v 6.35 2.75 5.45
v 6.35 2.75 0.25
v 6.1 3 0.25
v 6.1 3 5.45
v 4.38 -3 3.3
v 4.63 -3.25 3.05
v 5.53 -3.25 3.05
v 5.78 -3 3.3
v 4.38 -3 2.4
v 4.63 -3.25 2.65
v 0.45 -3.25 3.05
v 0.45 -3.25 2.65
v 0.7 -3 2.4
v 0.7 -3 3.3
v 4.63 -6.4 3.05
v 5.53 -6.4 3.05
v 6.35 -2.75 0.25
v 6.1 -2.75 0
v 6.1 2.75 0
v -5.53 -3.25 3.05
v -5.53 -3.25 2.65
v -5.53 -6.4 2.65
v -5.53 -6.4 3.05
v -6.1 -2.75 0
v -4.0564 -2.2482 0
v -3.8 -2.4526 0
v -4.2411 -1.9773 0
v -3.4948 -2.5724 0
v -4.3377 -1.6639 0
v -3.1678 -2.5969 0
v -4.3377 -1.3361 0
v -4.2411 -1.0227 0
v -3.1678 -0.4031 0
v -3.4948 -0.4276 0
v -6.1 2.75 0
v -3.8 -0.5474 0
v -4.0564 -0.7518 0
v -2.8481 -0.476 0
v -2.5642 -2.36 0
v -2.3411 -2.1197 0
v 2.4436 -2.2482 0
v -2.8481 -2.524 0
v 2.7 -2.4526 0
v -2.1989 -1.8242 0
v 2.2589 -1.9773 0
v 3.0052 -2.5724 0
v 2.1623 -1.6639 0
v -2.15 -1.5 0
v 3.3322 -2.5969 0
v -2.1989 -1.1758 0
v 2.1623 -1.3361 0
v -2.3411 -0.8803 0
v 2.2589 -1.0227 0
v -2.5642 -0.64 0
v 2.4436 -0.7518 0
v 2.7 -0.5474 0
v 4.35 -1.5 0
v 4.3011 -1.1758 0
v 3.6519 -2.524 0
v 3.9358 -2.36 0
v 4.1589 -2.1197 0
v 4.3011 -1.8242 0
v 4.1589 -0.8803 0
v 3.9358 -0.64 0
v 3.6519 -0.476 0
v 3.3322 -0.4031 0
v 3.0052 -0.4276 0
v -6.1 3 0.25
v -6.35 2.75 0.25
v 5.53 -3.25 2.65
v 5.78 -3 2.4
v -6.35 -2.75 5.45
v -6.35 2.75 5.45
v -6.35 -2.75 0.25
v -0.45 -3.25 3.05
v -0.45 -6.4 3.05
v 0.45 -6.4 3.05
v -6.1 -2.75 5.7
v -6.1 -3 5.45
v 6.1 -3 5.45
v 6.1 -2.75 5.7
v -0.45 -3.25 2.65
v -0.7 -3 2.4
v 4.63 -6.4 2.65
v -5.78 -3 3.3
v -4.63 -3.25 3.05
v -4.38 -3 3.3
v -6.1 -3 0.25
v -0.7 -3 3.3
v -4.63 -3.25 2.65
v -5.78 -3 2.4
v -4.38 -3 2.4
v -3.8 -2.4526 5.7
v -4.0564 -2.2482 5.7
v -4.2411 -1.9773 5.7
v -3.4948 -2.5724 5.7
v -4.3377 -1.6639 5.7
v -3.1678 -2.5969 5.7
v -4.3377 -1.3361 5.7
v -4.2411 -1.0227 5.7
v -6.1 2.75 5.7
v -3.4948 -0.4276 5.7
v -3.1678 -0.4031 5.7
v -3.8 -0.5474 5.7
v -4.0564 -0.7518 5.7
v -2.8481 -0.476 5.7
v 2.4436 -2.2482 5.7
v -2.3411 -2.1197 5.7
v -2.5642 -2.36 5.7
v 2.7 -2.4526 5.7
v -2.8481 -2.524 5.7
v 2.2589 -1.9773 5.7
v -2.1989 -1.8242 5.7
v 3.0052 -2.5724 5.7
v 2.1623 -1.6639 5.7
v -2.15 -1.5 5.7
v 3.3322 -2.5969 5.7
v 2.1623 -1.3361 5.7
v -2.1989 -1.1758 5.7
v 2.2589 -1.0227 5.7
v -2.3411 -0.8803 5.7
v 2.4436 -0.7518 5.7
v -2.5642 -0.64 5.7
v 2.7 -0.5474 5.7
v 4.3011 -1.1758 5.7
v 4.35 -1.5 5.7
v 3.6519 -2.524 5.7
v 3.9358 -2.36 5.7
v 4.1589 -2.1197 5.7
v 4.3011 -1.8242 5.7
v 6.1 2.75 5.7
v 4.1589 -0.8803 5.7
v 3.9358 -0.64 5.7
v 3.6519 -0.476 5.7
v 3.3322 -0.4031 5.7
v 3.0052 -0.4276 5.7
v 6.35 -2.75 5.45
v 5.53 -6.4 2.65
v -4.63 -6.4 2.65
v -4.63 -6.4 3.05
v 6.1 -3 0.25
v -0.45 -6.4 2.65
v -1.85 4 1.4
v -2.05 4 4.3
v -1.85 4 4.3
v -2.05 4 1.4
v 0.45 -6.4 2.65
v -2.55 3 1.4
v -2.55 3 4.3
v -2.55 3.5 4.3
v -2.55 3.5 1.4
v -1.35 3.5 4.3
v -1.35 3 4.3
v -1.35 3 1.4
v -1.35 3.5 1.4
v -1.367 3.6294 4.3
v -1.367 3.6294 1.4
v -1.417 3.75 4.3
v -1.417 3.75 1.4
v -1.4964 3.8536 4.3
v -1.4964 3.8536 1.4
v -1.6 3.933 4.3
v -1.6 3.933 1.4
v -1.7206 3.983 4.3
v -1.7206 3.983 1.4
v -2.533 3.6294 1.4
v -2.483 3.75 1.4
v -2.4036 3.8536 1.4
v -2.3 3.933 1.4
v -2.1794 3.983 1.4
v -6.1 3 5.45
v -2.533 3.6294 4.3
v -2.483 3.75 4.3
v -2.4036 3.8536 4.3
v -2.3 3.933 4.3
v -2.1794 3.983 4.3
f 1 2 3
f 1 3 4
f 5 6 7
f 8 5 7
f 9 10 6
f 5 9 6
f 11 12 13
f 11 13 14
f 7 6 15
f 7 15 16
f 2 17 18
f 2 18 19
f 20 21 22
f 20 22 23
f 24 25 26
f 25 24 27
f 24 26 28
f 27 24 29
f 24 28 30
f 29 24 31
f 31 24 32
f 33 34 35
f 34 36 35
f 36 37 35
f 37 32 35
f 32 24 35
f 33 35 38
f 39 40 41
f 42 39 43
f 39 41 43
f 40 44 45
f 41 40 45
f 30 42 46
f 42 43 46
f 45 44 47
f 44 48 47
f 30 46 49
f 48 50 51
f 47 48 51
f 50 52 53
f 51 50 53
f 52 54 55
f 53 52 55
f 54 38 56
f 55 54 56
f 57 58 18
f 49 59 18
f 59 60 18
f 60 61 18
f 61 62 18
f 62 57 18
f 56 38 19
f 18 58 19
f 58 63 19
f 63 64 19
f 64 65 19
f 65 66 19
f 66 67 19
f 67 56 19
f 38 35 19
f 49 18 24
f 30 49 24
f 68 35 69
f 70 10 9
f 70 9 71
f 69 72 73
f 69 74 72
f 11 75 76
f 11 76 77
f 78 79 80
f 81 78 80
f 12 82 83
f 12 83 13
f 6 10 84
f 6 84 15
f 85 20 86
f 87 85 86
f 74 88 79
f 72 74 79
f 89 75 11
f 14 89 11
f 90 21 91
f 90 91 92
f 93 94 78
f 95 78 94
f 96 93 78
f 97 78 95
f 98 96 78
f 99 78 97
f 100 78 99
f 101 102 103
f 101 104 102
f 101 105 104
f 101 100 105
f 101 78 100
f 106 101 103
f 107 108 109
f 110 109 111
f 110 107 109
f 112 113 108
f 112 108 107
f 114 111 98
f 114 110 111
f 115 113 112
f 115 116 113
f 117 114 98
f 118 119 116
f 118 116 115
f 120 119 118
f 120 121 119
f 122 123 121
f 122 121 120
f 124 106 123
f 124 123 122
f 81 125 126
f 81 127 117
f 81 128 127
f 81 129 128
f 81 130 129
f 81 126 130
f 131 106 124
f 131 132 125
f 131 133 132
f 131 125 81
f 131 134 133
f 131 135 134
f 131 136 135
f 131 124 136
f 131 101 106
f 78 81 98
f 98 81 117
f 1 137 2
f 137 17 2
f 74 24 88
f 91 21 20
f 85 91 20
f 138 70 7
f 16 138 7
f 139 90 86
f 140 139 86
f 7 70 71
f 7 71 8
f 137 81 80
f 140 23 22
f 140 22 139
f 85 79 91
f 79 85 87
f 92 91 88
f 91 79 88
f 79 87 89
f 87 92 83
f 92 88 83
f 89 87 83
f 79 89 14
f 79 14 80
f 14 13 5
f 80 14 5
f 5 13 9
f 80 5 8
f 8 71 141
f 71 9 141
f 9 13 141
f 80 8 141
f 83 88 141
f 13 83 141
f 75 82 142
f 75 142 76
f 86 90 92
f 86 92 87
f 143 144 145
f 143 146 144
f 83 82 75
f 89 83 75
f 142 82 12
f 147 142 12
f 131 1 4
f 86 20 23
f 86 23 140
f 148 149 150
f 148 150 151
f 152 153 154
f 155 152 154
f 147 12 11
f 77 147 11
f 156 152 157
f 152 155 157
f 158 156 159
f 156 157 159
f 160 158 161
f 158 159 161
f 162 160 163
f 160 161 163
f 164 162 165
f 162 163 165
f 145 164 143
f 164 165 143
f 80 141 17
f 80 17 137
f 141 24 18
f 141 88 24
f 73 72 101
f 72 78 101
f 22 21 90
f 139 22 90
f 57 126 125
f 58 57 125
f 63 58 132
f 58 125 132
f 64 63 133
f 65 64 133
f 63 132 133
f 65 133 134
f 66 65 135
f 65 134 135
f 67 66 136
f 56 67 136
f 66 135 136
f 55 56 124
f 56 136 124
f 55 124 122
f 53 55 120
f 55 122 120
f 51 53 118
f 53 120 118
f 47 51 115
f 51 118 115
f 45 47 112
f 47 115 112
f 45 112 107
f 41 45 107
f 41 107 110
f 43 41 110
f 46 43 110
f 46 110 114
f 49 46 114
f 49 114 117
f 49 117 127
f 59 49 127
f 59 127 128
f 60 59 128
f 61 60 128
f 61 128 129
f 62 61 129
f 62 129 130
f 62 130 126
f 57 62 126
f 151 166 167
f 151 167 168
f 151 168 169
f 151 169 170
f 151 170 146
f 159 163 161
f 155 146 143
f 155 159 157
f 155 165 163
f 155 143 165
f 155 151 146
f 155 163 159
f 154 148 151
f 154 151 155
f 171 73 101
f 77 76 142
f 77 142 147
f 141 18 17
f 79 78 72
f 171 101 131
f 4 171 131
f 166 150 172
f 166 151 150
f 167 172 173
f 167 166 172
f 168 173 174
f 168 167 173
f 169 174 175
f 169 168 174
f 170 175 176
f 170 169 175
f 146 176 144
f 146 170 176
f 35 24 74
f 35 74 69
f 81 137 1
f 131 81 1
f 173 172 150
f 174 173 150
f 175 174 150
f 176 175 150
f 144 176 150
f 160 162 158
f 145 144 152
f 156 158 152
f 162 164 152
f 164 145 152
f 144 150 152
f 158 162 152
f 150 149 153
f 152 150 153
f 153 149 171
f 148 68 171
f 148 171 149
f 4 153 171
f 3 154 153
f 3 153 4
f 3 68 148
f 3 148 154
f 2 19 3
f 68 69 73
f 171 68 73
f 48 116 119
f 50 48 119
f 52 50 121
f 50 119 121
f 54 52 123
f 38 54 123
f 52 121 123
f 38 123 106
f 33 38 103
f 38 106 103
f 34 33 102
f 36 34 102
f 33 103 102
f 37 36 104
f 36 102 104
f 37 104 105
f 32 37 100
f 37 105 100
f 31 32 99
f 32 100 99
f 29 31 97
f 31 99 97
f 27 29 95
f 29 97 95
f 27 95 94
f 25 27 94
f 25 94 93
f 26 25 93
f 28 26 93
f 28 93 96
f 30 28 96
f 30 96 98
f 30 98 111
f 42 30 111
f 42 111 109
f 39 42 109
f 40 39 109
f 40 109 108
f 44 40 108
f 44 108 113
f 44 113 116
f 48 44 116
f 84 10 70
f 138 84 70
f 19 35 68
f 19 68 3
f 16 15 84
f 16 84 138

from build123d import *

# Parameters (mm, degrees)
SCHIZZO1_W                   = 12.7
SCHIZZO1_H                   = 6
ESTRUSIONE_ESTRUSIONE1_DEPTH = 5.7
SCHIZZO2_W                   = 1.2
SCHIZZO2_H                   = 2.9
ESTRUSIONE_ESTRUSIONE2_DEPTH = 1
SCHIZZO3_R                   = 1.1
TAGLIO_ESTRUSIONE1_DEPTH     = 10.424038412
RACCORDO1_R                  = 0.5
SCHIZZO4_W                   = 0.9
SCHIZZO4_H                   = 0.4
ESTRUSIONE_ESTRUSIONE3_DEPTH = 3.4
RIPETIZIONE_A_L1_COUNT       = 2
RIPETIZIONE_A_L1_PITCH       = 5.08
RIPETIZIONE_A_L1_COL_COUNT   = 2
RIPETIZIONE_A_L1_COL_PITCH   = 5.08
SMUSSO1_SIZE                 = 0.25


with BuildPart() as part:
    # Schizzo1 → Estrusione-Estrusione1 (new body)
    with BuildSketch(Plane.XY):
        Rectangle(SCHIZZO1_W, SCHIZZO1_H)
    extrude(amount=ESTRUSIONE_ESTRUSIONE1_DEPTH)

    # Schizzo2 → Estrusione-Estrusione2 (add)
    with BuildSketch(Plane(origin=(0, 3, 0), x_dir=(1, 0, 0), z_dir=(0, 1, 0))):
        with Locations((-1.95, -2.85)):
            Rectangle(SCHIZZO2_W, SCHIZZO2_H)
    extrude(amount=ESTRUSIONE_ESTRUSIONE2_DEPTH)

    # Schizzo3 → Taglio-Estrusione1 (cut, through all)
    with BuildSketch(Plane.XY.offset(5.7)):
        with Locations((-3.25, -1.5)):
            Circle(SCHIZZO3_R)
        with Locations((3.25, -1.5)):
            Circle(SCHIZZO3_R)
    extrude(amount=-TAGLIO_ESTRUSIONE1_DEPTH, mode=Mode.SUBTRACT)

    # Raccordo1
    raccordo1_edges = [part.edges().sort_by_distance(p)[0] for p in [
        (-1.35, 4, 2.85),
        (-2.55, 4, 2.85),
    ]]
    fillet(raccordo1_edges, radius=RACCORDO1_R)

    # Schizzo4 → Estrusione-Estrusione3 (add)
    with BuildSketch(Plane.XZ.offset(3)):
        with Locations((0, 2.85)):
            Rectangle(SCHIZZO4_W, SCHIZZO4_H)
    estrusione_estrusione3 = extrude(amount=ESTRUSIONE_ESTRUSIONE3_DEPTH)

    # Ripetizione a L1: Estrusione-Estrusione3 ×2
    with Locations(*[(i * RIPETIZIONE_A_L1_PITCH, 0, 0) for i in range(1, RIPETIZIONE_A_L1_COUNT)]):
        add(estrusione_estrusione3)

    # Ripetizione a L1 col: Estrusione-Estrusione3 ×2
    with Locations(*[(-i * RIPETIZIONE_A_L1_COL_PITCH, 0, 0) for i in range(1, RIPETIZIONE_A_L1_COL_COUNT)]):
        add(estrusione_estrusione3)

    # Smusso1
    smusso1_edges = [part.edges().sort_by_distance(p)[0] for p in [
        (-6.35, 0, 5.7),
        (0, -3, 5.7),
        (6.35, 0, 5.7),
        (0, -3, 0),
        (0.45, -3, 2.85),
        (0, -3, 3.05),
        (-0.45, -3, 2.85),
        (0, -3, 2.65),
        (-6.35, 0, 0),
        (0, 3, 0),
        (6.35, 0, 0),
        (5.53, -3, 2.85),
        (5.08, -3, 3.05),
        (4.63, -3, 2.85),
        (5.08, -3, 2.65),
        (-4.63, -3, 2.85),
        (-5.08, -3, 3.05),
        (-5.53, -3, 2.85),
        (-5.08, -3, 2.65),
        (6.35, -3, 2.85),
        (-6.35, -3, 2.85),
        (-6.35, 3, 2.85),
        (6.35, 3, 2.85),
        (0, 3, 5.7),
    ]]
    chamfer(smusso1_edges, length=SMUSSO1_SIZE)


solid = part.part
